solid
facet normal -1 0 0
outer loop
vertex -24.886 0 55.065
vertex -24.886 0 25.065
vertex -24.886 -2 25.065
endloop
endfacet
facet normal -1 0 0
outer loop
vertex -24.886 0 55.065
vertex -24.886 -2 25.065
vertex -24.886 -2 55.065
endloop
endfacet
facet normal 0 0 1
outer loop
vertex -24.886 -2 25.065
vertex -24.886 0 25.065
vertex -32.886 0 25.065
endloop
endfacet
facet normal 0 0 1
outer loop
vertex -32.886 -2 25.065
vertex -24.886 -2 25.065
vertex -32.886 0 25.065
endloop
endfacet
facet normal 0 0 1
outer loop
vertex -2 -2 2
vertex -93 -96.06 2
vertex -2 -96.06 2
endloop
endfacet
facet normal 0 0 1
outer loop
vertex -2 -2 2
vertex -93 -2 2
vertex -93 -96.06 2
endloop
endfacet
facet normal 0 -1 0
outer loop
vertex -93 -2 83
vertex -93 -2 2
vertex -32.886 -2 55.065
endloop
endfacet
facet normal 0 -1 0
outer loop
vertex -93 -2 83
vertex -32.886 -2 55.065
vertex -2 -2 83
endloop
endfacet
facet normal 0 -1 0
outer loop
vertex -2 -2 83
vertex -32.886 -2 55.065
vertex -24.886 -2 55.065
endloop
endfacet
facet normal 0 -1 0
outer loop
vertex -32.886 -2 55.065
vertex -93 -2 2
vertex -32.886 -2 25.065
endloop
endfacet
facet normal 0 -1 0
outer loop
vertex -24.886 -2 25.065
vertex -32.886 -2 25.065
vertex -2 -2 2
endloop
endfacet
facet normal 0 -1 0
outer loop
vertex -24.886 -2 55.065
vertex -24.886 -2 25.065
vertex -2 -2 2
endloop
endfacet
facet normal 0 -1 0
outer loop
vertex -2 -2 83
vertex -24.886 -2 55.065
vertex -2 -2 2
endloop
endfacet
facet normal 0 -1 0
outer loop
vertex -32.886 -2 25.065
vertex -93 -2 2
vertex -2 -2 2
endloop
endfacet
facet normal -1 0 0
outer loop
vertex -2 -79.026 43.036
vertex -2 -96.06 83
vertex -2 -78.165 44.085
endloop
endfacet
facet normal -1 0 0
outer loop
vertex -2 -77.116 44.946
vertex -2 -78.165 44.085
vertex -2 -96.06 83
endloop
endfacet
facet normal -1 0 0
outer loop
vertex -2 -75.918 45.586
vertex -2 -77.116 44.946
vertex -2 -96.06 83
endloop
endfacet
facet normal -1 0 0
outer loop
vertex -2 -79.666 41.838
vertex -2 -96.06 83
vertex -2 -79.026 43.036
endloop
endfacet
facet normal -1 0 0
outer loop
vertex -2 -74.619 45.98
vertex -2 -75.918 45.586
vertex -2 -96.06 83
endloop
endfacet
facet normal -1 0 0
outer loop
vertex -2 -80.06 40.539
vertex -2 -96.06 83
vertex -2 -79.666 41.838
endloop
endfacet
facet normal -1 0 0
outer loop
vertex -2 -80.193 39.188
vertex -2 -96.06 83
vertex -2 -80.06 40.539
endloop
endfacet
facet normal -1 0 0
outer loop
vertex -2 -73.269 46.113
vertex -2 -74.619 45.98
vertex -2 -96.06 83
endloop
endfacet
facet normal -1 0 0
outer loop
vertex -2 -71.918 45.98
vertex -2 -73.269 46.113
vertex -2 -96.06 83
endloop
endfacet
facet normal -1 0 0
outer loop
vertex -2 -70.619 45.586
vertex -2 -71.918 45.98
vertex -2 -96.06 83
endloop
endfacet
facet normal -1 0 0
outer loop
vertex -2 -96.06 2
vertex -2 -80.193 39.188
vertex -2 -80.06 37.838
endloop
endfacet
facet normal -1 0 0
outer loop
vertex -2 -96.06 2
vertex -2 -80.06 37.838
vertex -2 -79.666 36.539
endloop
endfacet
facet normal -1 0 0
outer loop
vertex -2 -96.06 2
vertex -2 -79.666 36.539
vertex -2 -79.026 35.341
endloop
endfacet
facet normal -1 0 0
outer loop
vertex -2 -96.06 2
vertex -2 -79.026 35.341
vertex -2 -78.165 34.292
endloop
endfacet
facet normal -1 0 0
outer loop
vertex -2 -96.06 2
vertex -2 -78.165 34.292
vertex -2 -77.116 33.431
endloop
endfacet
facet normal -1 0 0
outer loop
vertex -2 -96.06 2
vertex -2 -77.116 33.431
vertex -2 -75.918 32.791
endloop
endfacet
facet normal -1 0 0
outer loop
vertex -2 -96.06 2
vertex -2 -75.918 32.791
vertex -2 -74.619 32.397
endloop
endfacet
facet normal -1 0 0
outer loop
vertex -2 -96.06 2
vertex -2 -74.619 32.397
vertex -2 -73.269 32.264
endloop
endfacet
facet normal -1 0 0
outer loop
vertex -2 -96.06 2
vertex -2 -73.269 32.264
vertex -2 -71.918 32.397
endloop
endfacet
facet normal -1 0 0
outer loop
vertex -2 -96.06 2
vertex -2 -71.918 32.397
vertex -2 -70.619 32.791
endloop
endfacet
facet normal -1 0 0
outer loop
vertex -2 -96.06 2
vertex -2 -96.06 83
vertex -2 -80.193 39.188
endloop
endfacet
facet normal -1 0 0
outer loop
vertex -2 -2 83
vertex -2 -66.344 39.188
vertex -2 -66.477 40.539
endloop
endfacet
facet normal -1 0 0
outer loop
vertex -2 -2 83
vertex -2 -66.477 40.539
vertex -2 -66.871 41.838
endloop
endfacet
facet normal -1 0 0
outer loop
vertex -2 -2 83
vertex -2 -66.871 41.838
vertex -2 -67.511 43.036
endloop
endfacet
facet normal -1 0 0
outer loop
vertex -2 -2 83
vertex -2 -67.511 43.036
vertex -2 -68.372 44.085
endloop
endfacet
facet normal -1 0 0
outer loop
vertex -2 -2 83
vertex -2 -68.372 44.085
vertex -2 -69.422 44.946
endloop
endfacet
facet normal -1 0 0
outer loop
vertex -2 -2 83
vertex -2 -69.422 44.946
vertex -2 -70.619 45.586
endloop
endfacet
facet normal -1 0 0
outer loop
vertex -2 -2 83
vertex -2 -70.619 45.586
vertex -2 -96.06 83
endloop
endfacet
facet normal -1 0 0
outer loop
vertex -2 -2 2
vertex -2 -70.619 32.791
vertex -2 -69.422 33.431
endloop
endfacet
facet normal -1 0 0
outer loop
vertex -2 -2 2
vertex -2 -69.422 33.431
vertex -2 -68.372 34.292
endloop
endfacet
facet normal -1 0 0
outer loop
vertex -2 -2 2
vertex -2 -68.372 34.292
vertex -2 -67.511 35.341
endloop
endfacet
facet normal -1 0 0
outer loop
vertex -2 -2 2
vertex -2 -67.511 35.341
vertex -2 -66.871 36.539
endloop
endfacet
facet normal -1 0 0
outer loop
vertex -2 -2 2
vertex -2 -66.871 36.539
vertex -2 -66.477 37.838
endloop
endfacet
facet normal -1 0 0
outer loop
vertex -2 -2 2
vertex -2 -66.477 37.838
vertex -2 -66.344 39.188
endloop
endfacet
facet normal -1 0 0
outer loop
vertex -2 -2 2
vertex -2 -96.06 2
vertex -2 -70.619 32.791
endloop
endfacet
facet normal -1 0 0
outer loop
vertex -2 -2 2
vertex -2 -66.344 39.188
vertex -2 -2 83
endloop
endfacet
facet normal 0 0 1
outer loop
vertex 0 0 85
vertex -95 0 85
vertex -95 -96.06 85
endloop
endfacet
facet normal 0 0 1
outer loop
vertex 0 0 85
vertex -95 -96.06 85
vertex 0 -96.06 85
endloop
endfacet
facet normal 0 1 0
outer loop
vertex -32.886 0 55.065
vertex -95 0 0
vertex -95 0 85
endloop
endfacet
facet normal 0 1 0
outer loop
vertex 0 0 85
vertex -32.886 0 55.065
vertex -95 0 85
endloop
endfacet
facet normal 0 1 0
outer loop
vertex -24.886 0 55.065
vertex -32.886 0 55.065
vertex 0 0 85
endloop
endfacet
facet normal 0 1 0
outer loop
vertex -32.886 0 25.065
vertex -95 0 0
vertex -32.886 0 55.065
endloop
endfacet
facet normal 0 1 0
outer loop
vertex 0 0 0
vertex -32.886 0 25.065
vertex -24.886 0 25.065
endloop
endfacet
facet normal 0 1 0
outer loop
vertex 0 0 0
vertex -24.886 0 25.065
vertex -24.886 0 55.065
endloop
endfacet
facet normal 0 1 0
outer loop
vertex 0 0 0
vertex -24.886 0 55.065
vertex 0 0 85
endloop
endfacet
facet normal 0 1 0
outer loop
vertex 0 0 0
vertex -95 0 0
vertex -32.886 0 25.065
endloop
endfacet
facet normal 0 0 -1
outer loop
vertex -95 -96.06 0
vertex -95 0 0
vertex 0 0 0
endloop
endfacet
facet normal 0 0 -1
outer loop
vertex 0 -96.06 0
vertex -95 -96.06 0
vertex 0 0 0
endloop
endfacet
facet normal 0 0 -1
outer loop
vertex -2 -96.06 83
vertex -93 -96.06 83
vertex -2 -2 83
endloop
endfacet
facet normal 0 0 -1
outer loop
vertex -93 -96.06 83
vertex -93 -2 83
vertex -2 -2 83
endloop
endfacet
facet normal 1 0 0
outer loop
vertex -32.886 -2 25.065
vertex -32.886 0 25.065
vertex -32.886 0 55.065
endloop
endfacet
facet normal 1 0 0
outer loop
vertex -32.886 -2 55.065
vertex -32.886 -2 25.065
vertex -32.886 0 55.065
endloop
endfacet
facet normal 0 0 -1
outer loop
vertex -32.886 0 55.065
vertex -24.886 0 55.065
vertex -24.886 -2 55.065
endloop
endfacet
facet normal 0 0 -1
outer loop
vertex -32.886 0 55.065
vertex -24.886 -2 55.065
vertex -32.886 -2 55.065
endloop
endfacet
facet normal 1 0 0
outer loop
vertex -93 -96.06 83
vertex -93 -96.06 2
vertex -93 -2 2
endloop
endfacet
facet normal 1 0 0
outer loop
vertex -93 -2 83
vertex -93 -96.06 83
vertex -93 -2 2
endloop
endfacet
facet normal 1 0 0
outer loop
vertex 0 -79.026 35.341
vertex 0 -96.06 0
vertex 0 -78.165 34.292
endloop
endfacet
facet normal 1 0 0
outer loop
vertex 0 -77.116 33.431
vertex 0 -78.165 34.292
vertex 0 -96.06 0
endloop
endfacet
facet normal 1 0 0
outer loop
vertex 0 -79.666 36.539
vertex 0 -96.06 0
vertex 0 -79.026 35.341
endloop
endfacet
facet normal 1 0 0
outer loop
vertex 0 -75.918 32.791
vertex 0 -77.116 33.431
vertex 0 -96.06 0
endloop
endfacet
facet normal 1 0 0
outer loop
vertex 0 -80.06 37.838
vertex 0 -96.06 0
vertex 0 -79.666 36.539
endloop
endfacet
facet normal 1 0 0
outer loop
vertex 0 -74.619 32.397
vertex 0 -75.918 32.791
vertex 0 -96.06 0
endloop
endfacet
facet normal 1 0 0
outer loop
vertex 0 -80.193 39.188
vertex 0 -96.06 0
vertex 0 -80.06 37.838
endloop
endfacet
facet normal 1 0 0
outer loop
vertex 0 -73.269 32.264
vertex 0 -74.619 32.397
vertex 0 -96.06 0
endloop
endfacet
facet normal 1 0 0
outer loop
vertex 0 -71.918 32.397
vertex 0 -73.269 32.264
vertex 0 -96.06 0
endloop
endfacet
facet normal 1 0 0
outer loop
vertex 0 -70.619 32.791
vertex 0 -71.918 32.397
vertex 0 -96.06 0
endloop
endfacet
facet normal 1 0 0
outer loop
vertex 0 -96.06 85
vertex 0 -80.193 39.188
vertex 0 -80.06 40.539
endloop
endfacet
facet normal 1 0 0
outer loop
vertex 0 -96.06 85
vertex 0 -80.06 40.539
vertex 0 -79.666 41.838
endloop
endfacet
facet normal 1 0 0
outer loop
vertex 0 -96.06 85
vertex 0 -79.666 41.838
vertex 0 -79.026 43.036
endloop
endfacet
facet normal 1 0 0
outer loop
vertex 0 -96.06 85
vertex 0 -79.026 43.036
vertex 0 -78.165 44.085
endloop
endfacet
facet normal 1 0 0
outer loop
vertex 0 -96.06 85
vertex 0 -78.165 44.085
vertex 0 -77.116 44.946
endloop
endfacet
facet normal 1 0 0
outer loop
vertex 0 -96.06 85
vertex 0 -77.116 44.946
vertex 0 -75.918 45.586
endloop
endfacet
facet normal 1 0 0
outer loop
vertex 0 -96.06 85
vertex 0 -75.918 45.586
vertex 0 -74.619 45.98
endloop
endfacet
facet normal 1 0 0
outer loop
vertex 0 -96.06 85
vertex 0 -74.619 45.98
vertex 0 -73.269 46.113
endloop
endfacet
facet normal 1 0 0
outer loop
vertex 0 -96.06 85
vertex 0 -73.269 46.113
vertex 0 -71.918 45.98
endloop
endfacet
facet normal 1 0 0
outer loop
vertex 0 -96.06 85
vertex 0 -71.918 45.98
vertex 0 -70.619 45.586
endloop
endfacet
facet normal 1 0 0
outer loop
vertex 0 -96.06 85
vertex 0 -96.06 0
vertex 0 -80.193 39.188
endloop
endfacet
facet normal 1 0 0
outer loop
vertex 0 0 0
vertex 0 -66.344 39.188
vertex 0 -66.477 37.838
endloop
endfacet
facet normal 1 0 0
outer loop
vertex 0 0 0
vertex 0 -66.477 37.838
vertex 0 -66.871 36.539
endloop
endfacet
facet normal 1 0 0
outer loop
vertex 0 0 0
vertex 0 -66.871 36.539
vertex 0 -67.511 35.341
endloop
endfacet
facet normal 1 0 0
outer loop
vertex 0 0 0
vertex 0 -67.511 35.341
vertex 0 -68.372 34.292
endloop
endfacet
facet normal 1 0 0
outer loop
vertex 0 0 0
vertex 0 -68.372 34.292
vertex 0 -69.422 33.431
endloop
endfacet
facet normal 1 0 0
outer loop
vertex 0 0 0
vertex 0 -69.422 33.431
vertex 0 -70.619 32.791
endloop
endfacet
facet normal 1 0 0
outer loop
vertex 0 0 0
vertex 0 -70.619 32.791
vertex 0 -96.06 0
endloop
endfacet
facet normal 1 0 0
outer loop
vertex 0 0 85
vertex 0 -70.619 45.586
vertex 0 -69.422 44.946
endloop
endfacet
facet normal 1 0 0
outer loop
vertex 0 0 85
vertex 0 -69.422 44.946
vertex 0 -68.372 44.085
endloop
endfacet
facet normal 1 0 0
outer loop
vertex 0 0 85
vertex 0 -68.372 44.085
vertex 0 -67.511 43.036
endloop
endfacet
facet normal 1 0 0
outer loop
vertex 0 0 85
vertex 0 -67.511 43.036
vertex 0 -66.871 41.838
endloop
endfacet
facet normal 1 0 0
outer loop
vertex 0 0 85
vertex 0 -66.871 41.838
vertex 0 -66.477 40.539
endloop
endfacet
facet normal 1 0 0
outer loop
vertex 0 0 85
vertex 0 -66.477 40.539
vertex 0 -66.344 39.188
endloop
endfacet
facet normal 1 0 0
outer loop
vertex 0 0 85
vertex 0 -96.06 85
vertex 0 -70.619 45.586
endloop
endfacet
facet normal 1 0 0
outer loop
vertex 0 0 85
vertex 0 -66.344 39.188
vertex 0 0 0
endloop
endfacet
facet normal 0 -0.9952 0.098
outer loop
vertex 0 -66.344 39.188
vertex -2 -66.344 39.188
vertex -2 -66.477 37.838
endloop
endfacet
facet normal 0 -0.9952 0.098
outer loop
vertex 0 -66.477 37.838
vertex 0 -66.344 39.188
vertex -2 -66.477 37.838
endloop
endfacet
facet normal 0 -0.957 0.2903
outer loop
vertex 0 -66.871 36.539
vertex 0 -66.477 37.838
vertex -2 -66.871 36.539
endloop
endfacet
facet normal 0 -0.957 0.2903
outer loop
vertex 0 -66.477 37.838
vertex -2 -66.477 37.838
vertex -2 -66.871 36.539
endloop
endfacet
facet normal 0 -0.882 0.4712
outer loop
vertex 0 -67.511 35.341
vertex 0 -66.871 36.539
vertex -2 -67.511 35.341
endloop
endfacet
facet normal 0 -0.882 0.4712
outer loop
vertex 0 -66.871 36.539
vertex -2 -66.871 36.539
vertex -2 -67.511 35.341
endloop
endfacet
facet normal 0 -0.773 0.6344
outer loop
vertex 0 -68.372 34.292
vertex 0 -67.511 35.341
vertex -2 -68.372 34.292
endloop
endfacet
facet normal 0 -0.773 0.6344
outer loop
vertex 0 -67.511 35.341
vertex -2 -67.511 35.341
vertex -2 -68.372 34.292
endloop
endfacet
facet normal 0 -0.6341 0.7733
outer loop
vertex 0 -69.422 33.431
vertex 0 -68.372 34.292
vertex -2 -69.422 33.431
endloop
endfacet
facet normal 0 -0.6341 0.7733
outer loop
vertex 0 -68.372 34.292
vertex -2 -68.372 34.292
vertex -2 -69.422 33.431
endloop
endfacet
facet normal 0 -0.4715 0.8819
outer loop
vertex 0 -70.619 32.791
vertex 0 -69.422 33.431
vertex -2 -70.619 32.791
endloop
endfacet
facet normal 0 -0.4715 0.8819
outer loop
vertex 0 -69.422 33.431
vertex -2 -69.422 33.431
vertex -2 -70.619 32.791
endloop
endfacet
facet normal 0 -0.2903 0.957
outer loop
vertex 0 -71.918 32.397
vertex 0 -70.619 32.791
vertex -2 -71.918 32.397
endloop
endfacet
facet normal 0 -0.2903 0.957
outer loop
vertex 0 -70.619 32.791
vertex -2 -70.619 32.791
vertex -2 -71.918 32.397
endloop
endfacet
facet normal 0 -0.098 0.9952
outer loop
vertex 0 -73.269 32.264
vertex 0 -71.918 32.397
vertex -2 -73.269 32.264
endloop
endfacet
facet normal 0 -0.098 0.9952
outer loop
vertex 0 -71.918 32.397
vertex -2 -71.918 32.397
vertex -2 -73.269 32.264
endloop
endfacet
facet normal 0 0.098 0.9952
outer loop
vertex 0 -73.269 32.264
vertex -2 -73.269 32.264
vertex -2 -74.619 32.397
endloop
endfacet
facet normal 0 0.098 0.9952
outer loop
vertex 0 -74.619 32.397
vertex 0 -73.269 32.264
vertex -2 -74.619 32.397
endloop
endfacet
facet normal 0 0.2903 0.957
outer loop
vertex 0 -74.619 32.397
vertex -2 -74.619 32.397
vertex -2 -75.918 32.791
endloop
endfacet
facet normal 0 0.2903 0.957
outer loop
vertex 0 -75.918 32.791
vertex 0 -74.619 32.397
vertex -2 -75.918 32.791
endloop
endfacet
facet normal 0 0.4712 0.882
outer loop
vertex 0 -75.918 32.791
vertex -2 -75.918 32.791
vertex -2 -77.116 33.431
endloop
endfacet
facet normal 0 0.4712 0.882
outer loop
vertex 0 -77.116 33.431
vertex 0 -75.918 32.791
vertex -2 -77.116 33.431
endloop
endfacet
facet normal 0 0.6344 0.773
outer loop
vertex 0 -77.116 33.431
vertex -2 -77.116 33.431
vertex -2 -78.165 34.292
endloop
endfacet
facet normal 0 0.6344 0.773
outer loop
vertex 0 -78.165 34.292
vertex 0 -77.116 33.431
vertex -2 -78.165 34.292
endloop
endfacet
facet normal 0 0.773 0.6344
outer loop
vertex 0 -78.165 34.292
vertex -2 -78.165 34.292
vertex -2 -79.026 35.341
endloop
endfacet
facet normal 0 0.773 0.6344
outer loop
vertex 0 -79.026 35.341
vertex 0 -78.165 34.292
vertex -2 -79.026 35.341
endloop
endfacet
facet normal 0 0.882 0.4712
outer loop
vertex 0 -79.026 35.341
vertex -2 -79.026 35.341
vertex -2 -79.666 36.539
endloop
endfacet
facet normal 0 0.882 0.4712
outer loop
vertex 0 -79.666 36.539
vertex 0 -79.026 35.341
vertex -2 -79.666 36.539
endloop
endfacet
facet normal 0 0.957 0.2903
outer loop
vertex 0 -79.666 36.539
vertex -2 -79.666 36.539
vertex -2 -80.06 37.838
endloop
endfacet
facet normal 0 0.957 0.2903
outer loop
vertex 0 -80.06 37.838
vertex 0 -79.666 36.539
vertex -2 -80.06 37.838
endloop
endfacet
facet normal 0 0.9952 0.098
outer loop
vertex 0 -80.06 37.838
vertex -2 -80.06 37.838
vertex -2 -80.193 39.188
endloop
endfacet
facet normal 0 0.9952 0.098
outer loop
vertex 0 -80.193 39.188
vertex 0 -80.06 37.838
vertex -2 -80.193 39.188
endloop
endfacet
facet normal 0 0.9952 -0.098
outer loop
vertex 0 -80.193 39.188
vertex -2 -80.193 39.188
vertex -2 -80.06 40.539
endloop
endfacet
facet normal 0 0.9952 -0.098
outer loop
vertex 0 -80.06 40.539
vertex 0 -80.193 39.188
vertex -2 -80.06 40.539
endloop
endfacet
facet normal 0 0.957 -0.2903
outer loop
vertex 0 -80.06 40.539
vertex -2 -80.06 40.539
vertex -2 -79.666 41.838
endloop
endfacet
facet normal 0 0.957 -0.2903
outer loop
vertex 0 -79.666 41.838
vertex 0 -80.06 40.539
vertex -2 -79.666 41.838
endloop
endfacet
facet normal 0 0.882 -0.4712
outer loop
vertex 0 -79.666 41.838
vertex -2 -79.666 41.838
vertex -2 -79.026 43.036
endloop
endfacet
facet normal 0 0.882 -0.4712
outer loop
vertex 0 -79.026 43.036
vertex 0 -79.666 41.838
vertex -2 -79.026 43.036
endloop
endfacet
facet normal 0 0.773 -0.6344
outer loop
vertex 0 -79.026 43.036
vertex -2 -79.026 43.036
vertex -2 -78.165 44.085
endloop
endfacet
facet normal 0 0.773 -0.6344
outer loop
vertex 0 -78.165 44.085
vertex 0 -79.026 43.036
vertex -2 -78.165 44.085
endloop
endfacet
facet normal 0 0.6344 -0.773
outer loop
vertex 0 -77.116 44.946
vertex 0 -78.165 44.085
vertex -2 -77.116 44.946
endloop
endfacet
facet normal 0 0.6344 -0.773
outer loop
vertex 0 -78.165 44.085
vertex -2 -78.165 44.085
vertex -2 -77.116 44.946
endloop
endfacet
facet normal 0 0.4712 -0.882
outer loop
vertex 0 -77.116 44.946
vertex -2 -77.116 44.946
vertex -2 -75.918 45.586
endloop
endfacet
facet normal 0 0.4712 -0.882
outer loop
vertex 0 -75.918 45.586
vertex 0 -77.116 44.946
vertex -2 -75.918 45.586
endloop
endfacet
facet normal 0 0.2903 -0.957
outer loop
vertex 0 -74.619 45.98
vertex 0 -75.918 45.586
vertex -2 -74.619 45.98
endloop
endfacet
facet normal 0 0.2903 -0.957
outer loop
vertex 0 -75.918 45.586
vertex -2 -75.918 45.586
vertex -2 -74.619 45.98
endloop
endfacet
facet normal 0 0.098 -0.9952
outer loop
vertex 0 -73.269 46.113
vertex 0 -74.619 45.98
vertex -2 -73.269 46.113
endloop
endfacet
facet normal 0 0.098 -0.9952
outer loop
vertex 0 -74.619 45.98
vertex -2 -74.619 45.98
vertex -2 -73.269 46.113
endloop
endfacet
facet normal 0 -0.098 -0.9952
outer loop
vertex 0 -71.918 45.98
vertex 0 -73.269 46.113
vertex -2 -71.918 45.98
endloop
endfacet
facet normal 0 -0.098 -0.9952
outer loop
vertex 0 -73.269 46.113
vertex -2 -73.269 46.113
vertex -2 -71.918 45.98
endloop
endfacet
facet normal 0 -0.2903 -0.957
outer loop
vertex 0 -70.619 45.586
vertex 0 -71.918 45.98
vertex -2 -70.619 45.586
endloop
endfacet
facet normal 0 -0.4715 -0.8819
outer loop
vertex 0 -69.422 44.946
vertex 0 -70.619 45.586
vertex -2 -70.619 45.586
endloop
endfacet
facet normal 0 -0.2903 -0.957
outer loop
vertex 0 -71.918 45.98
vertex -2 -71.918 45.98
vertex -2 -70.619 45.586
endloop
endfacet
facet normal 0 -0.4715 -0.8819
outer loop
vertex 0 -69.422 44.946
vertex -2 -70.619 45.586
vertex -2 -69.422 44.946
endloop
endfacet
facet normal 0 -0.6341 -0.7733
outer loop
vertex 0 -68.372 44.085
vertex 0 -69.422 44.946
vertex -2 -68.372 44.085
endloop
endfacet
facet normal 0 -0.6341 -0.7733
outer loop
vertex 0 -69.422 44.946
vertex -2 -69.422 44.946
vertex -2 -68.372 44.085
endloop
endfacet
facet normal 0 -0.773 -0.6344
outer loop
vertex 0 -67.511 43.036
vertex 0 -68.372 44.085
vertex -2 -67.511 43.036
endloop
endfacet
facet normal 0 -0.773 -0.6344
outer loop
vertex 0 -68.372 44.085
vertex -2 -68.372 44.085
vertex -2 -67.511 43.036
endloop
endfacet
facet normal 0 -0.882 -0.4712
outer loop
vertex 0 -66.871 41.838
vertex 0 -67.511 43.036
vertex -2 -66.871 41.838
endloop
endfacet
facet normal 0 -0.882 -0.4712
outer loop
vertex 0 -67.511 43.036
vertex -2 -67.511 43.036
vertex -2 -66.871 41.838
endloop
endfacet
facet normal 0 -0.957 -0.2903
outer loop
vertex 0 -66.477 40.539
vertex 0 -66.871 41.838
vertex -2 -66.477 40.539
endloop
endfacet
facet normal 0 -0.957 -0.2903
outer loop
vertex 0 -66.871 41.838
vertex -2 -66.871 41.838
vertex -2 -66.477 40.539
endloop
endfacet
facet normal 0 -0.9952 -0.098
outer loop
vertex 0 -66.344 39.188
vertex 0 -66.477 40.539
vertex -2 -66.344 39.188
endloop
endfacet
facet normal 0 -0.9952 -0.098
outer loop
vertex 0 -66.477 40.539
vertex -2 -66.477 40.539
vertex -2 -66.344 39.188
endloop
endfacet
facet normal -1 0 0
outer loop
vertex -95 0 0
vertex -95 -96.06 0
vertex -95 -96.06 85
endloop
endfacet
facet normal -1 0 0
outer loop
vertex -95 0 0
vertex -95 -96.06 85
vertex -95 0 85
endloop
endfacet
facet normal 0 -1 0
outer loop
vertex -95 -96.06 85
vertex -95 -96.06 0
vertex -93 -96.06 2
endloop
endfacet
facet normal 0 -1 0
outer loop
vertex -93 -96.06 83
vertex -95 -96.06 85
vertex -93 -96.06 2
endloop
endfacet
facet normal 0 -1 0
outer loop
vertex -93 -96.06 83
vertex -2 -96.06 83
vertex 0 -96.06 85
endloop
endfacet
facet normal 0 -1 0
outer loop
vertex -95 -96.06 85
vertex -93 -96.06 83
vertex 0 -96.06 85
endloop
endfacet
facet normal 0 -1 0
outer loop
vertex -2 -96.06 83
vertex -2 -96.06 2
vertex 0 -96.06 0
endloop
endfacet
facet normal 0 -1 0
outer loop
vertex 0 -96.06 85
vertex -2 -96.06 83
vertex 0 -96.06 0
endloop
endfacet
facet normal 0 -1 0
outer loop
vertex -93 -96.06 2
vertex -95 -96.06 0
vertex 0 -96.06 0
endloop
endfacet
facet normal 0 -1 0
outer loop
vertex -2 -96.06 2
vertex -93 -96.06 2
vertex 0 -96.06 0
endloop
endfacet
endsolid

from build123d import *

# Parameters (mm, degrees)
F0_W      = 95
F0_H      = 96.059554
F1_DEPTH  = 85
F2_T      = -2
F3_R      = 6.924471
F4_DEPTH  = 65.166272
F4_FACE_R = 6.924471
F5_DEPTH  = 140.461847
F6_W      = 8
F6_H      = 30
F7_DEPTH  = 21.398656


with BuildPart() as f1:
    # F0 (on Top) → F1 (new body)
    with BuildSketch(Plane.XY):
        with Locations((-47.5, -48.029777)):
            Rectangle(F0_W, F0_H)
    extrude(amount=F1_DEPTH)

    # F2
    f2_openings = [f1.faces().sort_by_distance(p)[0] for p in [
        (-47.5, -96.059554, 42.5),
    ]]
    offset(amount=F2_T, openings=f2_openings)

    # F3 (on face) → F4 (join)
    with BuildSketch(Plane.YZ):
        with Locations((-73.268585, 39.188489)):
            Circle(F3_R)
    extrude(amount=-F4_DEPTH)

    # F4_face (on face) → F5 (cut)
    with BuildSketch(Plane(origin=(-65.166272, -73.268585, 39.188489), x_dir=(0, 1, 0), z_dir=(-1, 0, 0))):
        Circle(F4_FACE_R)
    extrude(amount=-F5_DEPTH, mode=Mode.SUBTRACT)

    # F6 (on face) → F7 (cut)
    with BuildSketch(Plane(origin=(0, 0, 0), x_dir=(-1, 0, 0), z_dir=(0, 1, 0))):
        with Locations((28.885877, 40.065341)):
            Rectangle(F6_W, F6_H)
    extrude(amount=-F7_DEPTH, mode=Mode.SUBTRACT)


solid = f1.part
